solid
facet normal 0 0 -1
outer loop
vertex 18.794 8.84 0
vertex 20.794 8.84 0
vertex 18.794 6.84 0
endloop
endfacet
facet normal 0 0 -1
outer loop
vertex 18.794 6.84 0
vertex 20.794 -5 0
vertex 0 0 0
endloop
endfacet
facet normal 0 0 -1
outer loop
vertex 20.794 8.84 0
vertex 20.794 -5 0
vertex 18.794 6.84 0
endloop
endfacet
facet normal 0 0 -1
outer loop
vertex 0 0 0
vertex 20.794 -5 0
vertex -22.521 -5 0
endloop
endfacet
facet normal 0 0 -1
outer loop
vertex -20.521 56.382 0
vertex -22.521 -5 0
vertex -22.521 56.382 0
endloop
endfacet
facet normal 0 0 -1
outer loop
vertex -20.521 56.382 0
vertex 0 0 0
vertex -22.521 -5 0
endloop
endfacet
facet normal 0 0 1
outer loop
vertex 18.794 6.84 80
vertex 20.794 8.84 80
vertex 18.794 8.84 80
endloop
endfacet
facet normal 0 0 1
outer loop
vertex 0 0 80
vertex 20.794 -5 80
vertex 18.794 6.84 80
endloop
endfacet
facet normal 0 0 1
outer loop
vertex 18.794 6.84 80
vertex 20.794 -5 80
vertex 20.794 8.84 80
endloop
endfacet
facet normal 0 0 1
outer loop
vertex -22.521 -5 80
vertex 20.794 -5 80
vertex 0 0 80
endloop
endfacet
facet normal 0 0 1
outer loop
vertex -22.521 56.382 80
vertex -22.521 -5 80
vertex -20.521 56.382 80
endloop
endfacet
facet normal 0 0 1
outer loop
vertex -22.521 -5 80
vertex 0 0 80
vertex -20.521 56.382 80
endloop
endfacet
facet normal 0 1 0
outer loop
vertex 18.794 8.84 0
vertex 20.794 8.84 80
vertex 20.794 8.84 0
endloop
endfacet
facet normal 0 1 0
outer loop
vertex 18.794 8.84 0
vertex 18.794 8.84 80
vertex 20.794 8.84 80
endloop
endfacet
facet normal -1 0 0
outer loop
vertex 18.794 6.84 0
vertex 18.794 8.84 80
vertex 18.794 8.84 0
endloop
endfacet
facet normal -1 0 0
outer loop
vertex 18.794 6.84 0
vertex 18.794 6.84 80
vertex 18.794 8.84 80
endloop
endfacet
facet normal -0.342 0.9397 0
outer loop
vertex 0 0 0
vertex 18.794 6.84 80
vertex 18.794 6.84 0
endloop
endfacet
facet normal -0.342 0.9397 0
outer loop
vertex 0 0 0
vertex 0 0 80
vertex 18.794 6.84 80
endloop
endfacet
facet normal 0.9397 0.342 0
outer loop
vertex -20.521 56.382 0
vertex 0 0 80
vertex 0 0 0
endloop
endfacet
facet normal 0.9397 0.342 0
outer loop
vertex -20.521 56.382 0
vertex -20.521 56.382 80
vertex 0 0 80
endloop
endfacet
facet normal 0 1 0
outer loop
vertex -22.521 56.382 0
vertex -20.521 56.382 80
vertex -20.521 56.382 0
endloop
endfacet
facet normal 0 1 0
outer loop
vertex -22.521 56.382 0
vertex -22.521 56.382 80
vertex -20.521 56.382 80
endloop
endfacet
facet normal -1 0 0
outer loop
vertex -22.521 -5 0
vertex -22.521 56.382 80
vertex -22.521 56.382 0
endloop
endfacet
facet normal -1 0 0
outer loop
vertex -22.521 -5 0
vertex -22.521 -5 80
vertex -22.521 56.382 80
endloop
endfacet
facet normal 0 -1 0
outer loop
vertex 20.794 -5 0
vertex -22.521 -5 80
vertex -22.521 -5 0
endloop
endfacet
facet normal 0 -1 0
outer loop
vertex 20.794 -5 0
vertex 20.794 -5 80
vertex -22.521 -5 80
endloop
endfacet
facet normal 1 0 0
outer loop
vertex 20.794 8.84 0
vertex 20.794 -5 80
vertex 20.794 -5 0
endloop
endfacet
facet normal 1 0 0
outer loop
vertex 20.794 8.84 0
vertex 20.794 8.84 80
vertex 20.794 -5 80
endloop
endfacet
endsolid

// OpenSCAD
mm = 1;
width = 80 * mm;
depth = 20 * mm;
height = 60 * mm;
tilt = 20;
min_thickness = 2 * mm;
base_height = 5 * mm;

module profile()
{
    polygon([
        [depth * cos(tilt) + min_thickness, -base_height],
        [depth * cos(tilt) + min_thickness, depth * sin(tilt)],
        [depth * cos(tilt) + min_thickness, depth * sin(tilt) + min_thickness],
        [depth * cos(tilt), depth * sin(tilt) + min_thickness],
        [depth * cos(tilt), depth * sin(tilt)],
        [0, 0],
        height * [-sin(tilt), cos(tilt)],
        [-height * sin(tilt) - min_thickness, height * cos(tilt)],
        [-height * sin(tilt) - min_thickness, -base_height],
    ]);
}

module phone_stand()
{
    linear_extrude(width) profile();
}

phone_stand();
